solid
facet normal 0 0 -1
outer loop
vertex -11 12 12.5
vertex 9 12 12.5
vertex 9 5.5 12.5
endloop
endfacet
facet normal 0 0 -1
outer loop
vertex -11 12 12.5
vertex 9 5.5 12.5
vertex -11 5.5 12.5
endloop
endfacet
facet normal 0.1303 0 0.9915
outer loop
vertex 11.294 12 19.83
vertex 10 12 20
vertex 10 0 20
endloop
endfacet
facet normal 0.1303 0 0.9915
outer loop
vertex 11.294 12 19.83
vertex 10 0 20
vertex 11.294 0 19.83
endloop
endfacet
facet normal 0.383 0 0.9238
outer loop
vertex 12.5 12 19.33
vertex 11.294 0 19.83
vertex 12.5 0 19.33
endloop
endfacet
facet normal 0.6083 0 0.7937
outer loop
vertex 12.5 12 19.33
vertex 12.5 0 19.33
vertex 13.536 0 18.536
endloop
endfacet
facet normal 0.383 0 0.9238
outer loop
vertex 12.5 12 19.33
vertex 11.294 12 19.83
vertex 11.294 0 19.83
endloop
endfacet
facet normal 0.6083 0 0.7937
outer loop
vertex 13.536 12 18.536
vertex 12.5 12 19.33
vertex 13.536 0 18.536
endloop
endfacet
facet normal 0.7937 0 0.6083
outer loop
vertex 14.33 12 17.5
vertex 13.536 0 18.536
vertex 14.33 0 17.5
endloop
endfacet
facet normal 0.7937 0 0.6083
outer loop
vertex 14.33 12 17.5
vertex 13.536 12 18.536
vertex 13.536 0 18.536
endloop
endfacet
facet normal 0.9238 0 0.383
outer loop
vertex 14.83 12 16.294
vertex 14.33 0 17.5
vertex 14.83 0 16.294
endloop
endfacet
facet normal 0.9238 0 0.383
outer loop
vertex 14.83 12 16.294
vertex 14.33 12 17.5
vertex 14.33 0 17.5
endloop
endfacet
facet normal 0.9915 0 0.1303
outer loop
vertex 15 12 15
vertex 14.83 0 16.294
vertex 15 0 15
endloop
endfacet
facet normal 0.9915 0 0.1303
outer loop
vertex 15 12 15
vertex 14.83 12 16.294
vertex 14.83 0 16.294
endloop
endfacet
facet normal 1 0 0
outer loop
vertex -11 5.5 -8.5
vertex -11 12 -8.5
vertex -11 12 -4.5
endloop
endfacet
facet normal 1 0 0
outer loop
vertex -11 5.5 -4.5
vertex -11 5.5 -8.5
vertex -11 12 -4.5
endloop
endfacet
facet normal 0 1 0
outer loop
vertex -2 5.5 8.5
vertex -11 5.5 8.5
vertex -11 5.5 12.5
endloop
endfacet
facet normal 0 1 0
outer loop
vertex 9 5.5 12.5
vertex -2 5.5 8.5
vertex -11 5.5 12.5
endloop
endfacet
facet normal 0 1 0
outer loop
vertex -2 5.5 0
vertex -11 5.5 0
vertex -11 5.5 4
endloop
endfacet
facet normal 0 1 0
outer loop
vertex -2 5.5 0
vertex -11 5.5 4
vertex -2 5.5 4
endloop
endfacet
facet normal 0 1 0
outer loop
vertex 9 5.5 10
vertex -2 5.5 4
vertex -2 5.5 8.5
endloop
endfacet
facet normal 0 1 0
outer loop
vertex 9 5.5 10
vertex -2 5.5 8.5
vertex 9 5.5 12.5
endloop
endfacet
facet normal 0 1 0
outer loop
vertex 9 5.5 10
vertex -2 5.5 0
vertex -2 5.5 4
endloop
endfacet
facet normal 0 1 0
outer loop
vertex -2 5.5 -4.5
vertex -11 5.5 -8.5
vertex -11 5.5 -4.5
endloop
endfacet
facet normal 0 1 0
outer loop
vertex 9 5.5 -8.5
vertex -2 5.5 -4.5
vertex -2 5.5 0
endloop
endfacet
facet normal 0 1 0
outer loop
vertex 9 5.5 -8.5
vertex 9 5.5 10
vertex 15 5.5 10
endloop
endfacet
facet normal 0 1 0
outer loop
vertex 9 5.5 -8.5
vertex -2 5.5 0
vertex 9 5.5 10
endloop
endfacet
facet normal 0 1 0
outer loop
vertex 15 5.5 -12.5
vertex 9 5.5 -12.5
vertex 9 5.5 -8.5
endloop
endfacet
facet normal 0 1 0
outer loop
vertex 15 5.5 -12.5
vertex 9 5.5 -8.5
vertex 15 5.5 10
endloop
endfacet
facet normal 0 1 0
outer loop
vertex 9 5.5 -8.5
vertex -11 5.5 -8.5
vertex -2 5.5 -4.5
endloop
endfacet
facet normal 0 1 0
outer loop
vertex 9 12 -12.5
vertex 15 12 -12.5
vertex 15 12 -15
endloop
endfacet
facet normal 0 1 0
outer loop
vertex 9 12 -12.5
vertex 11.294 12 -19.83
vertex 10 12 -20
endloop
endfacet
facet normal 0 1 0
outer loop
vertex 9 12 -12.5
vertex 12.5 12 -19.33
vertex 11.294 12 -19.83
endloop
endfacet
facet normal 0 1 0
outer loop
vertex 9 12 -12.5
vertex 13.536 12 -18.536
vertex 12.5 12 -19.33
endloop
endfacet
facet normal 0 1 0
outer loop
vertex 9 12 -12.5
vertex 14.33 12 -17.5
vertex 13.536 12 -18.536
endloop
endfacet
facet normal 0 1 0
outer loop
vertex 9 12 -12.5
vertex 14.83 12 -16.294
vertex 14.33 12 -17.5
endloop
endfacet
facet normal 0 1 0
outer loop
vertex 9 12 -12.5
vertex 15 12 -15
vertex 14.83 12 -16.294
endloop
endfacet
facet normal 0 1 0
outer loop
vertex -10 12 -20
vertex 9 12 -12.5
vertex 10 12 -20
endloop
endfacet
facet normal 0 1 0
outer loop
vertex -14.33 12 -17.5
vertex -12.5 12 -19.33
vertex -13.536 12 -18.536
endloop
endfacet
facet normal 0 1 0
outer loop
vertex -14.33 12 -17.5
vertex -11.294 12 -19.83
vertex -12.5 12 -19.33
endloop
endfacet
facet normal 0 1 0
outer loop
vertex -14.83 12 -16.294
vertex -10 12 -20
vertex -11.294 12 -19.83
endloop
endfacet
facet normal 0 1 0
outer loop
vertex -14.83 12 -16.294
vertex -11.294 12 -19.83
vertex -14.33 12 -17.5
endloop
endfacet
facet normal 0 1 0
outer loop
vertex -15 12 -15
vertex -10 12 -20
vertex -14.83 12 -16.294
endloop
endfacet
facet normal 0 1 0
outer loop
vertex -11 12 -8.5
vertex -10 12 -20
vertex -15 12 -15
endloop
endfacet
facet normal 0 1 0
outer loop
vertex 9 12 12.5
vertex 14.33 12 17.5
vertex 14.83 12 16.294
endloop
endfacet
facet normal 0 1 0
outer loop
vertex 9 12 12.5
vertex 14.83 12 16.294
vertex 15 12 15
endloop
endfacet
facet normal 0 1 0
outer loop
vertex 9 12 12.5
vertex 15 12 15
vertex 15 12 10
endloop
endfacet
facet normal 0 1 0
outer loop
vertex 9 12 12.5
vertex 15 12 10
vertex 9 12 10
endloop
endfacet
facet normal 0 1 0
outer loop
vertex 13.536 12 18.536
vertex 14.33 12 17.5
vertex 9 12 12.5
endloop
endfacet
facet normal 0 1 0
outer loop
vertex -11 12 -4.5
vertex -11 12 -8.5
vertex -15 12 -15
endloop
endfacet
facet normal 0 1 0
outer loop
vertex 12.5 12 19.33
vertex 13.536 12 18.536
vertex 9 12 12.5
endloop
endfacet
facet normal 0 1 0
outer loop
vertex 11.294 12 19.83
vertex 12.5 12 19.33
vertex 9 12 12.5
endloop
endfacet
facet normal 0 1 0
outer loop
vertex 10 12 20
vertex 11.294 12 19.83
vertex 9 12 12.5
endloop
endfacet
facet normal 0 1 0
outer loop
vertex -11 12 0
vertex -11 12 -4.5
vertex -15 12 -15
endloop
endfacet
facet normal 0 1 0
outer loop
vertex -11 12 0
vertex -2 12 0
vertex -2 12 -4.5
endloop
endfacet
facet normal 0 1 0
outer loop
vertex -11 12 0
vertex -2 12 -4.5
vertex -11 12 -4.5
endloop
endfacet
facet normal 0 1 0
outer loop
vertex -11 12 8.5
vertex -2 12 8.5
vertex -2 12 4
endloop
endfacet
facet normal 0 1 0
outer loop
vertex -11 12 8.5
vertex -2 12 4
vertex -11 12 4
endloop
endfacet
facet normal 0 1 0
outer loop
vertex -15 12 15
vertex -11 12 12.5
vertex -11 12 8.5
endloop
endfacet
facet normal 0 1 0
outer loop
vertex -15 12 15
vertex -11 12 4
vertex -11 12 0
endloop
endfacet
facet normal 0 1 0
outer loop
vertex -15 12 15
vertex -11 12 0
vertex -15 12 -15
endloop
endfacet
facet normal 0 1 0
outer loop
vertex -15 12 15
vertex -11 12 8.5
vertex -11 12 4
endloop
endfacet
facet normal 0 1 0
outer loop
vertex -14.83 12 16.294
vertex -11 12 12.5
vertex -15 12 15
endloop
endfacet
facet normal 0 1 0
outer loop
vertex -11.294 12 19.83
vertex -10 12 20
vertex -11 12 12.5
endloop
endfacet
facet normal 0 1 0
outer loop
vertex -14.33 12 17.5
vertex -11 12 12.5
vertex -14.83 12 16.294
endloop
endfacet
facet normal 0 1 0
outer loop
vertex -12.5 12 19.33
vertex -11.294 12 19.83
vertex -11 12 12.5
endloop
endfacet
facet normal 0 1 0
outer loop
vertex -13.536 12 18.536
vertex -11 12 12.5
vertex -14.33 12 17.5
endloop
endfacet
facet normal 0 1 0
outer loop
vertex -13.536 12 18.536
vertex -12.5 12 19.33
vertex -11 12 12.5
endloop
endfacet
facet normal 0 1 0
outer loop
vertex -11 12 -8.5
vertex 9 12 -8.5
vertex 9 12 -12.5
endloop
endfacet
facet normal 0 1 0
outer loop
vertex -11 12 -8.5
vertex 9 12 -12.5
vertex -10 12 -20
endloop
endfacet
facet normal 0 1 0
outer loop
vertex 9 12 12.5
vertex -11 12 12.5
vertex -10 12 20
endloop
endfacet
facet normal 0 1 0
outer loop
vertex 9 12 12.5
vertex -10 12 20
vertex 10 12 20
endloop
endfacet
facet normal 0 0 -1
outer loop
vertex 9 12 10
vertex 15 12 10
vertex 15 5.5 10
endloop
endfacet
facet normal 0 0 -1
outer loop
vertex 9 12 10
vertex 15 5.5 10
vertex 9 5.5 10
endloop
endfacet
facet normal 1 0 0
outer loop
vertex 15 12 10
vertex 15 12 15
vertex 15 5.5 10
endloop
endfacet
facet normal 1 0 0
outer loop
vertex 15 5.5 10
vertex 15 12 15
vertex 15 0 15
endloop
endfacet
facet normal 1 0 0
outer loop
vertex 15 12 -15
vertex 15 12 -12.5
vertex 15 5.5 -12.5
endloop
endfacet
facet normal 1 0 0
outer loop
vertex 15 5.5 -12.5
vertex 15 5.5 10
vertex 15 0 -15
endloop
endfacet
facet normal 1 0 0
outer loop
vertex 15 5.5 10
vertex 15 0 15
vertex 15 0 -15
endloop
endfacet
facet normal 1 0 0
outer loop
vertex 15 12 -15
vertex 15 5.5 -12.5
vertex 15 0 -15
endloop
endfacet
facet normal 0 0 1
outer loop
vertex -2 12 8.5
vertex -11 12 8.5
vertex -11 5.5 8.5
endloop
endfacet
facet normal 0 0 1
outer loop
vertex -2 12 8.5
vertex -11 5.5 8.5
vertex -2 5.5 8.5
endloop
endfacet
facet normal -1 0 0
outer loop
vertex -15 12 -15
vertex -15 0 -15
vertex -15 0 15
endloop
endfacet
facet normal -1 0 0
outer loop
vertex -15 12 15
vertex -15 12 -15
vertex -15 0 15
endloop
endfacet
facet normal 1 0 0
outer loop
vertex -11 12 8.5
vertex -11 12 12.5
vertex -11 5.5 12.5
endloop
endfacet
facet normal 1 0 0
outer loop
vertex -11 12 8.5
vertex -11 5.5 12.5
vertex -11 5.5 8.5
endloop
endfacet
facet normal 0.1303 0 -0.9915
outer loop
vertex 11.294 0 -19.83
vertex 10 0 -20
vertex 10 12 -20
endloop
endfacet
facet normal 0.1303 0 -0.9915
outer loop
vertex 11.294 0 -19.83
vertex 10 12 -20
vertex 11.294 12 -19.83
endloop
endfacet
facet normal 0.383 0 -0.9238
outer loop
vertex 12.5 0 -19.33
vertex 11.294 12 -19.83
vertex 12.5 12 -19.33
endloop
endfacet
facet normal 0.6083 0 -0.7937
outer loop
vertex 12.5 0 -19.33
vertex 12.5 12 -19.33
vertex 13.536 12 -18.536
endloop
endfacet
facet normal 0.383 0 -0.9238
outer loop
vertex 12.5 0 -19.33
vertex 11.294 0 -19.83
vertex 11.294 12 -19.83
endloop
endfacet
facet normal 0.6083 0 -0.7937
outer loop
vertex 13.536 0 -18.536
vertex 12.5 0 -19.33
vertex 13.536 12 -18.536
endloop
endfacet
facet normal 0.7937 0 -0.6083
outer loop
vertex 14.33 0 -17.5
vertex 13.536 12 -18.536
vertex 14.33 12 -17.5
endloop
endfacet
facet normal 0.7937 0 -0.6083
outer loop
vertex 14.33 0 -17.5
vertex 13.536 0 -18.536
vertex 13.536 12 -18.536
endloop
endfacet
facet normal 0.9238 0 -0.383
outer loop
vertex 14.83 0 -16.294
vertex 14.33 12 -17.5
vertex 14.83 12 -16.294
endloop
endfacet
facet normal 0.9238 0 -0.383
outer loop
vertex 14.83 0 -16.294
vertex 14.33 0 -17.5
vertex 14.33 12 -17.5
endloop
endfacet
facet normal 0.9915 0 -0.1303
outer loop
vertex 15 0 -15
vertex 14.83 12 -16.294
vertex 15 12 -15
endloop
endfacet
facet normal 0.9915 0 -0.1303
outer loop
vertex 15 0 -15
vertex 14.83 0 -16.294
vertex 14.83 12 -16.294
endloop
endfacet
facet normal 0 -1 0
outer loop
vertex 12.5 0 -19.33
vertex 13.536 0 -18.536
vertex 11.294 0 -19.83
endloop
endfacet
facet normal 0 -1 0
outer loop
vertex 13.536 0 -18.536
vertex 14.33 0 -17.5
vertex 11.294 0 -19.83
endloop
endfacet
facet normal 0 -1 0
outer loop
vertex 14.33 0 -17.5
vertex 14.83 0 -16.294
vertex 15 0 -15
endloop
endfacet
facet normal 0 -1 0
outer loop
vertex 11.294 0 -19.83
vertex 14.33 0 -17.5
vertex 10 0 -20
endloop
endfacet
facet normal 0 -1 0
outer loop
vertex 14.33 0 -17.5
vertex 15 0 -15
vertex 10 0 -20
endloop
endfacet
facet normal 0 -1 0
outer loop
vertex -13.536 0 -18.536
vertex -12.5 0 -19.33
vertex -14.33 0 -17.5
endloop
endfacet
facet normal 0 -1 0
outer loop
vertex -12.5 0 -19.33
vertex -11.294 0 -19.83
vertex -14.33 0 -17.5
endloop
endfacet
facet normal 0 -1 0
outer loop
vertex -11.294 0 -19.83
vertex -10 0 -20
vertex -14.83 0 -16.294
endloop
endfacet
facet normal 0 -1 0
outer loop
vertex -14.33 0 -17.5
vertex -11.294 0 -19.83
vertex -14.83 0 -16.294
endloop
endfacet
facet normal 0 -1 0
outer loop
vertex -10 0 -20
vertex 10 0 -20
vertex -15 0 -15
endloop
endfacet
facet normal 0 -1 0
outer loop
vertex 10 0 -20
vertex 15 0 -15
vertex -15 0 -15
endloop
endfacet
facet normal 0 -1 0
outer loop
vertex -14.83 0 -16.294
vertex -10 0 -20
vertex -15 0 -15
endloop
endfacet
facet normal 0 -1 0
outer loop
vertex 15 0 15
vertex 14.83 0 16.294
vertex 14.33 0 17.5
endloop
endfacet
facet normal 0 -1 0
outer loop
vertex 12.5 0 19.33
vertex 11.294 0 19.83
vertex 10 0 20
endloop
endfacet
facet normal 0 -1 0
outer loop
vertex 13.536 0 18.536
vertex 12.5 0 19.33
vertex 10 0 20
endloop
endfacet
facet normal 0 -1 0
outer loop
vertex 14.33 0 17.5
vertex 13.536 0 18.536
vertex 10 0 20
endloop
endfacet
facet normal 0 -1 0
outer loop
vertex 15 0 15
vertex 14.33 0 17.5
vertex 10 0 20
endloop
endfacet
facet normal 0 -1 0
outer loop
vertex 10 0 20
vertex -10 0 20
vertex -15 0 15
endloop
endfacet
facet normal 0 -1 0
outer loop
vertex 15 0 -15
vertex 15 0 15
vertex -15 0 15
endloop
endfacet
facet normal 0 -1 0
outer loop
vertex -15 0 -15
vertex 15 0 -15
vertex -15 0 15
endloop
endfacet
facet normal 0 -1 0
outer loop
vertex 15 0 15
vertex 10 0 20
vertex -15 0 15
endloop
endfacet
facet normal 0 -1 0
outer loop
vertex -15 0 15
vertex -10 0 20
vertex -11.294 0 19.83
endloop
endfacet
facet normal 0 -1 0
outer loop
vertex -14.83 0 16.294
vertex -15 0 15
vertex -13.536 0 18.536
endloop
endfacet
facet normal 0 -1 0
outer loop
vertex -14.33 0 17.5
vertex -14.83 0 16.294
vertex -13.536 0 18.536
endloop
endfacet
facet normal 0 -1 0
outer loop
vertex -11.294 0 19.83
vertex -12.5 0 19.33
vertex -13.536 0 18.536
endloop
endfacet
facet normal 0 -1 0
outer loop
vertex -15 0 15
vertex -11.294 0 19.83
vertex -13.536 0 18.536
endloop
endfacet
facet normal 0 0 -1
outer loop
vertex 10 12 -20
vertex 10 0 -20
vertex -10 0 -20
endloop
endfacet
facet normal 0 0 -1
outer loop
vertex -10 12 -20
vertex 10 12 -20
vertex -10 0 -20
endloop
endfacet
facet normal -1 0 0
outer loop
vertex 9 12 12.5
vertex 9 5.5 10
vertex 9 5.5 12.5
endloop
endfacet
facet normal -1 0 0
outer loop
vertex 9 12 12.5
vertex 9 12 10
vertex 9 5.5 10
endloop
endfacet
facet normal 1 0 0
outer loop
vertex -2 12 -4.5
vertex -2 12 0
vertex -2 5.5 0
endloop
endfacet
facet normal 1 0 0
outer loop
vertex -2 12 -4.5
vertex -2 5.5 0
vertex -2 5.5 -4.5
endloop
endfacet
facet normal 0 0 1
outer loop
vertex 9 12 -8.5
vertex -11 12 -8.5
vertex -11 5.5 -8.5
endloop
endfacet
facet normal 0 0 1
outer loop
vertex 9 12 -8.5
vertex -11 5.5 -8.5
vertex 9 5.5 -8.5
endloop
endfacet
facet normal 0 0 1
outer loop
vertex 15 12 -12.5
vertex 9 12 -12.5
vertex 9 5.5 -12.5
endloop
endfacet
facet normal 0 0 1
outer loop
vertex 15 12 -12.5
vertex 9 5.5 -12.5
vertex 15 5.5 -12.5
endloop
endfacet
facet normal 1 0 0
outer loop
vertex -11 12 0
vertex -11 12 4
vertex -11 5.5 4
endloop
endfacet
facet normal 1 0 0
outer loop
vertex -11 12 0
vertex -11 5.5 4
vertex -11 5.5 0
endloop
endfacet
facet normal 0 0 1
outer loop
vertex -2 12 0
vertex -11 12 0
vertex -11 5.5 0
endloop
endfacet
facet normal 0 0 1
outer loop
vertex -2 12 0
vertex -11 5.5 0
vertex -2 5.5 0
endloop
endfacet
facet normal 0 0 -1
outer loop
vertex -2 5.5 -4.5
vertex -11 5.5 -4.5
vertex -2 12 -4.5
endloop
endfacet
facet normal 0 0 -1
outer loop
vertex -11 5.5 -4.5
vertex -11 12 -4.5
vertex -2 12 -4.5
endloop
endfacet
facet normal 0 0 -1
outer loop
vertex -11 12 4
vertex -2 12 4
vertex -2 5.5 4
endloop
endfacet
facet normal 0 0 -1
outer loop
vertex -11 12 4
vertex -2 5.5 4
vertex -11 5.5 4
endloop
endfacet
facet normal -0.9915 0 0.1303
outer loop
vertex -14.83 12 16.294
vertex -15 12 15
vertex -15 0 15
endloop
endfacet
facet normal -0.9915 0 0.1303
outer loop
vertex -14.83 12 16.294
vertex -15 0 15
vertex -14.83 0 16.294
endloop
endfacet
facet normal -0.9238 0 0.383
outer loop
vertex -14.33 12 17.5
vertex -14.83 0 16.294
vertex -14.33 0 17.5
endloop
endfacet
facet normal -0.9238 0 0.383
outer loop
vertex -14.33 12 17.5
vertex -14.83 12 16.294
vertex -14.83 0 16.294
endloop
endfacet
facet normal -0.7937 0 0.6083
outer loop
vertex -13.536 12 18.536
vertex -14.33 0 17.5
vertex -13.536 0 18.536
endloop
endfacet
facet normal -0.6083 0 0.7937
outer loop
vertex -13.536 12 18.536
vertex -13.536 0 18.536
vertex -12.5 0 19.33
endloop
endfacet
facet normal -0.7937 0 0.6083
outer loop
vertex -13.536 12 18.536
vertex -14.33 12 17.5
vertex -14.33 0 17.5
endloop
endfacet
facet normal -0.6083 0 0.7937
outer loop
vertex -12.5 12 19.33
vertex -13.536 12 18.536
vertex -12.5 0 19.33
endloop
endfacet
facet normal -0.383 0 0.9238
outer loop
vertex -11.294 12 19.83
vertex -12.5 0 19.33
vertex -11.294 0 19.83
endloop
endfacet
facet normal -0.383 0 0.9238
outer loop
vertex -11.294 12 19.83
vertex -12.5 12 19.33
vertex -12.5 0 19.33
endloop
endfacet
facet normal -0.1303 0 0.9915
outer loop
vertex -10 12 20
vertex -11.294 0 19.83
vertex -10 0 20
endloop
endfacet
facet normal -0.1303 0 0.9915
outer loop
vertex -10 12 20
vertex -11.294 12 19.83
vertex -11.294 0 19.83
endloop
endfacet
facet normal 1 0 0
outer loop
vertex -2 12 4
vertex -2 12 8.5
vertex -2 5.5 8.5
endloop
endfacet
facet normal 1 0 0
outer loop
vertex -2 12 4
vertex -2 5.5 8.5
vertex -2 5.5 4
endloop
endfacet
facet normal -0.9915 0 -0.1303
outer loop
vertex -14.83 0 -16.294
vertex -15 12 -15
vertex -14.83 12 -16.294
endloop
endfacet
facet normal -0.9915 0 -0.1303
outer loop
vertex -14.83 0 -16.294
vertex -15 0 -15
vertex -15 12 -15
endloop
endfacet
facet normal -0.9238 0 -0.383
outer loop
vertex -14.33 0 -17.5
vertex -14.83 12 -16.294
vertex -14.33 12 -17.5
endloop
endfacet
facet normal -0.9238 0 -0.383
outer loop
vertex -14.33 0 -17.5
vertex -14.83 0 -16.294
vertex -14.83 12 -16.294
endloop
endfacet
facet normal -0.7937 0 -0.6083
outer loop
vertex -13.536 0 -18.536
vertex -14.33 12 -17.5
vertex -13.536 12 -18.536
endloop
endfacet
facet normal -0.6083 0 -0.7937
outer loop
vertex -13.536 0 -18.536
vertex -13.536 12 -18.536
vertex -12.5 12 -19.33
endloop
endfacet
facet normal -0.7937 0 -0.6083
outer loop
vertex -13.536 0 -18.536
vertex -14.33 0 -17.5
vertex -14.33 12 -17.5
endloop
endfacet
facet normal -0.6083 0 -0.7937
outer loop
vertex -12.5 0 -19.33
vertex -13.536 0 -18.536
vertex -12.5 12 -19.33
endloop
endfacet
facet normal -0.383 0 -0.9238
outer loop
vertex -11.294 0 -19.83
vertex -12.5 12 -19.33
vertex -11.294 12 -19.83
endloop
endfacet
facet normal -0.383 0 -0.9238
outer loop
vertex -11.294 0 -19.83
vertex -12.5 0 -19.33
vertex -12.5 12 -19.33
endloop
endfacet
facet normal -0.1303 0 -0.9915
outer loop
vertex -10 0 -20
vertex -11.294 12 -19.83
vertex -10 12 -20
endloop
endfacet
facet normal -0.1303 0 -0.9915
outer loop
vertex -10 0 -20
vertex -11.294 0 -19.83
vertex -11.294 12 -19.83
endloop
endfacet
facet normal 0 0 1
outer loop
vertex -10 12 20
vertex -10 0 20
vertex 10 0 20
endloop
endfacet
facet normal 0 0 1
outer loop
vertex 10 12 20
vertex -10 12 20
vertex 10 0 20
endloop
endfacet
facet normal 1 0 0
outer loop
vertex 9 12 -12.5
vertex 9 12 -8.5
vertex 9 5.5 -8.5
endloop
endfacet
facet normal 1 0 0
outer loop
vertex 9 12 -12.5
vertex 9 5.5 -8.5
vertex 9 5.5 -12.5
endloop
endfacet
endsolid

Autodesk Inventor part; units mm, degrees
ref_plane "YZ Plane" through (0, 0, 0) normal (1, 0, 0) x (0, 1, 0)
ref_plane "XZ Plane" through (0, 0, 0) normal (0, 1, 0) x (-1, 0, 0)
ref_plane "XY Plane" through (0, 0, 0) normal (0, 0, 1) x (1, 0, 0)
sketch "Sketch1" plane through (0, 0, 0) normal (0, 1, 0) x (-1, 0, 0)
  line L0 (15, 20) -> (-15, 20)
  line L1 (-15, 20) -> (-15, -20)
  line L2 (-15, -20) -> (15, -20)
  line L3 (15, -20) -> (15, 20)
  line L4 (15, 20) -> (-15, -20) construction
  line L5 (-15, 20) -> (15, -20) construction
  point P0 (0, 0)
  dimension "d0" = 30
  dimension "d1" = 40
extrude "Extrusion1" add sketch "Sketch1" along normal blind 12
sketch "Sketch2" plane through (0, 12, 0) normal (0, 1, 0) x (1, 0, 0)
  line L0 (15, -20) -> (15, 20) projected
  line L1 (15, -12.5) -> (-2, -12.5)
  line L2 (-2, 8.5) -> (9, 8.5)
  line L3 (15, 8.5) -> (15, -12.5)
  line L4 (15, -10) -> (9, -10)
  line L5 (9, -10) -> (9, -12.5)
  line L6 (9, -12.5) -> (15, -12.5)
  line L7 (15, -12.5) -> (15, -10)
  line L8 (-2, -12.5) -> (-7, -12.5)
  line L9 (-7, -12.5) -> (-7, -8.5)
  line L10 (-7, -8.5) -> (-2, -8.5)
  line L11 (-2, -8.5) -> (-2, -12.5)
  line L12 (-2, -4) -> (-7, -4)
  line L13 (-7, -4) -> (-7, 0)
  line L14 (-7, 0) -> (-2, 0)
  line L15 (-2, 8.5) -> (-7, 8.5)
  line L16 (-7, 8.5) -> (-7, 4.5)
  line L17 (-7, 4.5) -> (-2, 4.5)
  line L18 (-2, 4.5) -> (-2, 8.5)
  line L19 (15, 8.5) -> (9, 8.5)
  line L20 (9, 8.5) -> (9, 12.5)
  line L21 (9, 12.5) -> (15, 12.5)
  line L22 (15, 12.5) -> (15, 8.5)
  line L23 (-2, -8.5) -> (-2, -4)
  line L24 (-2, 0) -> (-2, 4.5)
  line L25 (-15, -20) -> (15, -20) projected
  line L26 (15, 20) -> (-15, 20) projected
  point P0 (0, 0)
  point P1 (15, -10)
  dimension "d4" = 21
  dimension "d5" = 17
  dimension "d7" = 2.5
  dimension "d8" = 5
  dimension "d9" = 4
  dimension "d10" = 4
  dimension "d11" = 4
  dimension "d12" = 4.5
  dimension "d13" = 4.5
  dimension "d14" = 4
  dimension "d15" = 7.5
  dimension "d22" = 25
  dimension "d23" = 7.5
extrude "Extrusion2" cut sketch "Sketch2" against normal blind 6.5 contours L4 L5 L1 L11 L23 L12 L13 L14 L24 L18 L2 L19 L0 | L19 L20 L21 L0 | L8 L9 L10 L11 | L18 L17 L16 L15
move faces "Move1" translate (-4, 0, 0) faces at (-7, 9.8333, 9.8333) (-7, 9.8333, 1.3333) (-7, 9.8333, -7.1667)
fillet "Fillet1" radius 5 4 edges at (-15, 6, -20) (-15, 6, 20) (15, 6, -20) (15, 6, 20)
equation "\"d10\" = d9"
equation "\"d11\" = d9"
equation "\"d13\" = d12"
equation "\"d15\" = d23"
properties part number "wooden_limitswitch"
